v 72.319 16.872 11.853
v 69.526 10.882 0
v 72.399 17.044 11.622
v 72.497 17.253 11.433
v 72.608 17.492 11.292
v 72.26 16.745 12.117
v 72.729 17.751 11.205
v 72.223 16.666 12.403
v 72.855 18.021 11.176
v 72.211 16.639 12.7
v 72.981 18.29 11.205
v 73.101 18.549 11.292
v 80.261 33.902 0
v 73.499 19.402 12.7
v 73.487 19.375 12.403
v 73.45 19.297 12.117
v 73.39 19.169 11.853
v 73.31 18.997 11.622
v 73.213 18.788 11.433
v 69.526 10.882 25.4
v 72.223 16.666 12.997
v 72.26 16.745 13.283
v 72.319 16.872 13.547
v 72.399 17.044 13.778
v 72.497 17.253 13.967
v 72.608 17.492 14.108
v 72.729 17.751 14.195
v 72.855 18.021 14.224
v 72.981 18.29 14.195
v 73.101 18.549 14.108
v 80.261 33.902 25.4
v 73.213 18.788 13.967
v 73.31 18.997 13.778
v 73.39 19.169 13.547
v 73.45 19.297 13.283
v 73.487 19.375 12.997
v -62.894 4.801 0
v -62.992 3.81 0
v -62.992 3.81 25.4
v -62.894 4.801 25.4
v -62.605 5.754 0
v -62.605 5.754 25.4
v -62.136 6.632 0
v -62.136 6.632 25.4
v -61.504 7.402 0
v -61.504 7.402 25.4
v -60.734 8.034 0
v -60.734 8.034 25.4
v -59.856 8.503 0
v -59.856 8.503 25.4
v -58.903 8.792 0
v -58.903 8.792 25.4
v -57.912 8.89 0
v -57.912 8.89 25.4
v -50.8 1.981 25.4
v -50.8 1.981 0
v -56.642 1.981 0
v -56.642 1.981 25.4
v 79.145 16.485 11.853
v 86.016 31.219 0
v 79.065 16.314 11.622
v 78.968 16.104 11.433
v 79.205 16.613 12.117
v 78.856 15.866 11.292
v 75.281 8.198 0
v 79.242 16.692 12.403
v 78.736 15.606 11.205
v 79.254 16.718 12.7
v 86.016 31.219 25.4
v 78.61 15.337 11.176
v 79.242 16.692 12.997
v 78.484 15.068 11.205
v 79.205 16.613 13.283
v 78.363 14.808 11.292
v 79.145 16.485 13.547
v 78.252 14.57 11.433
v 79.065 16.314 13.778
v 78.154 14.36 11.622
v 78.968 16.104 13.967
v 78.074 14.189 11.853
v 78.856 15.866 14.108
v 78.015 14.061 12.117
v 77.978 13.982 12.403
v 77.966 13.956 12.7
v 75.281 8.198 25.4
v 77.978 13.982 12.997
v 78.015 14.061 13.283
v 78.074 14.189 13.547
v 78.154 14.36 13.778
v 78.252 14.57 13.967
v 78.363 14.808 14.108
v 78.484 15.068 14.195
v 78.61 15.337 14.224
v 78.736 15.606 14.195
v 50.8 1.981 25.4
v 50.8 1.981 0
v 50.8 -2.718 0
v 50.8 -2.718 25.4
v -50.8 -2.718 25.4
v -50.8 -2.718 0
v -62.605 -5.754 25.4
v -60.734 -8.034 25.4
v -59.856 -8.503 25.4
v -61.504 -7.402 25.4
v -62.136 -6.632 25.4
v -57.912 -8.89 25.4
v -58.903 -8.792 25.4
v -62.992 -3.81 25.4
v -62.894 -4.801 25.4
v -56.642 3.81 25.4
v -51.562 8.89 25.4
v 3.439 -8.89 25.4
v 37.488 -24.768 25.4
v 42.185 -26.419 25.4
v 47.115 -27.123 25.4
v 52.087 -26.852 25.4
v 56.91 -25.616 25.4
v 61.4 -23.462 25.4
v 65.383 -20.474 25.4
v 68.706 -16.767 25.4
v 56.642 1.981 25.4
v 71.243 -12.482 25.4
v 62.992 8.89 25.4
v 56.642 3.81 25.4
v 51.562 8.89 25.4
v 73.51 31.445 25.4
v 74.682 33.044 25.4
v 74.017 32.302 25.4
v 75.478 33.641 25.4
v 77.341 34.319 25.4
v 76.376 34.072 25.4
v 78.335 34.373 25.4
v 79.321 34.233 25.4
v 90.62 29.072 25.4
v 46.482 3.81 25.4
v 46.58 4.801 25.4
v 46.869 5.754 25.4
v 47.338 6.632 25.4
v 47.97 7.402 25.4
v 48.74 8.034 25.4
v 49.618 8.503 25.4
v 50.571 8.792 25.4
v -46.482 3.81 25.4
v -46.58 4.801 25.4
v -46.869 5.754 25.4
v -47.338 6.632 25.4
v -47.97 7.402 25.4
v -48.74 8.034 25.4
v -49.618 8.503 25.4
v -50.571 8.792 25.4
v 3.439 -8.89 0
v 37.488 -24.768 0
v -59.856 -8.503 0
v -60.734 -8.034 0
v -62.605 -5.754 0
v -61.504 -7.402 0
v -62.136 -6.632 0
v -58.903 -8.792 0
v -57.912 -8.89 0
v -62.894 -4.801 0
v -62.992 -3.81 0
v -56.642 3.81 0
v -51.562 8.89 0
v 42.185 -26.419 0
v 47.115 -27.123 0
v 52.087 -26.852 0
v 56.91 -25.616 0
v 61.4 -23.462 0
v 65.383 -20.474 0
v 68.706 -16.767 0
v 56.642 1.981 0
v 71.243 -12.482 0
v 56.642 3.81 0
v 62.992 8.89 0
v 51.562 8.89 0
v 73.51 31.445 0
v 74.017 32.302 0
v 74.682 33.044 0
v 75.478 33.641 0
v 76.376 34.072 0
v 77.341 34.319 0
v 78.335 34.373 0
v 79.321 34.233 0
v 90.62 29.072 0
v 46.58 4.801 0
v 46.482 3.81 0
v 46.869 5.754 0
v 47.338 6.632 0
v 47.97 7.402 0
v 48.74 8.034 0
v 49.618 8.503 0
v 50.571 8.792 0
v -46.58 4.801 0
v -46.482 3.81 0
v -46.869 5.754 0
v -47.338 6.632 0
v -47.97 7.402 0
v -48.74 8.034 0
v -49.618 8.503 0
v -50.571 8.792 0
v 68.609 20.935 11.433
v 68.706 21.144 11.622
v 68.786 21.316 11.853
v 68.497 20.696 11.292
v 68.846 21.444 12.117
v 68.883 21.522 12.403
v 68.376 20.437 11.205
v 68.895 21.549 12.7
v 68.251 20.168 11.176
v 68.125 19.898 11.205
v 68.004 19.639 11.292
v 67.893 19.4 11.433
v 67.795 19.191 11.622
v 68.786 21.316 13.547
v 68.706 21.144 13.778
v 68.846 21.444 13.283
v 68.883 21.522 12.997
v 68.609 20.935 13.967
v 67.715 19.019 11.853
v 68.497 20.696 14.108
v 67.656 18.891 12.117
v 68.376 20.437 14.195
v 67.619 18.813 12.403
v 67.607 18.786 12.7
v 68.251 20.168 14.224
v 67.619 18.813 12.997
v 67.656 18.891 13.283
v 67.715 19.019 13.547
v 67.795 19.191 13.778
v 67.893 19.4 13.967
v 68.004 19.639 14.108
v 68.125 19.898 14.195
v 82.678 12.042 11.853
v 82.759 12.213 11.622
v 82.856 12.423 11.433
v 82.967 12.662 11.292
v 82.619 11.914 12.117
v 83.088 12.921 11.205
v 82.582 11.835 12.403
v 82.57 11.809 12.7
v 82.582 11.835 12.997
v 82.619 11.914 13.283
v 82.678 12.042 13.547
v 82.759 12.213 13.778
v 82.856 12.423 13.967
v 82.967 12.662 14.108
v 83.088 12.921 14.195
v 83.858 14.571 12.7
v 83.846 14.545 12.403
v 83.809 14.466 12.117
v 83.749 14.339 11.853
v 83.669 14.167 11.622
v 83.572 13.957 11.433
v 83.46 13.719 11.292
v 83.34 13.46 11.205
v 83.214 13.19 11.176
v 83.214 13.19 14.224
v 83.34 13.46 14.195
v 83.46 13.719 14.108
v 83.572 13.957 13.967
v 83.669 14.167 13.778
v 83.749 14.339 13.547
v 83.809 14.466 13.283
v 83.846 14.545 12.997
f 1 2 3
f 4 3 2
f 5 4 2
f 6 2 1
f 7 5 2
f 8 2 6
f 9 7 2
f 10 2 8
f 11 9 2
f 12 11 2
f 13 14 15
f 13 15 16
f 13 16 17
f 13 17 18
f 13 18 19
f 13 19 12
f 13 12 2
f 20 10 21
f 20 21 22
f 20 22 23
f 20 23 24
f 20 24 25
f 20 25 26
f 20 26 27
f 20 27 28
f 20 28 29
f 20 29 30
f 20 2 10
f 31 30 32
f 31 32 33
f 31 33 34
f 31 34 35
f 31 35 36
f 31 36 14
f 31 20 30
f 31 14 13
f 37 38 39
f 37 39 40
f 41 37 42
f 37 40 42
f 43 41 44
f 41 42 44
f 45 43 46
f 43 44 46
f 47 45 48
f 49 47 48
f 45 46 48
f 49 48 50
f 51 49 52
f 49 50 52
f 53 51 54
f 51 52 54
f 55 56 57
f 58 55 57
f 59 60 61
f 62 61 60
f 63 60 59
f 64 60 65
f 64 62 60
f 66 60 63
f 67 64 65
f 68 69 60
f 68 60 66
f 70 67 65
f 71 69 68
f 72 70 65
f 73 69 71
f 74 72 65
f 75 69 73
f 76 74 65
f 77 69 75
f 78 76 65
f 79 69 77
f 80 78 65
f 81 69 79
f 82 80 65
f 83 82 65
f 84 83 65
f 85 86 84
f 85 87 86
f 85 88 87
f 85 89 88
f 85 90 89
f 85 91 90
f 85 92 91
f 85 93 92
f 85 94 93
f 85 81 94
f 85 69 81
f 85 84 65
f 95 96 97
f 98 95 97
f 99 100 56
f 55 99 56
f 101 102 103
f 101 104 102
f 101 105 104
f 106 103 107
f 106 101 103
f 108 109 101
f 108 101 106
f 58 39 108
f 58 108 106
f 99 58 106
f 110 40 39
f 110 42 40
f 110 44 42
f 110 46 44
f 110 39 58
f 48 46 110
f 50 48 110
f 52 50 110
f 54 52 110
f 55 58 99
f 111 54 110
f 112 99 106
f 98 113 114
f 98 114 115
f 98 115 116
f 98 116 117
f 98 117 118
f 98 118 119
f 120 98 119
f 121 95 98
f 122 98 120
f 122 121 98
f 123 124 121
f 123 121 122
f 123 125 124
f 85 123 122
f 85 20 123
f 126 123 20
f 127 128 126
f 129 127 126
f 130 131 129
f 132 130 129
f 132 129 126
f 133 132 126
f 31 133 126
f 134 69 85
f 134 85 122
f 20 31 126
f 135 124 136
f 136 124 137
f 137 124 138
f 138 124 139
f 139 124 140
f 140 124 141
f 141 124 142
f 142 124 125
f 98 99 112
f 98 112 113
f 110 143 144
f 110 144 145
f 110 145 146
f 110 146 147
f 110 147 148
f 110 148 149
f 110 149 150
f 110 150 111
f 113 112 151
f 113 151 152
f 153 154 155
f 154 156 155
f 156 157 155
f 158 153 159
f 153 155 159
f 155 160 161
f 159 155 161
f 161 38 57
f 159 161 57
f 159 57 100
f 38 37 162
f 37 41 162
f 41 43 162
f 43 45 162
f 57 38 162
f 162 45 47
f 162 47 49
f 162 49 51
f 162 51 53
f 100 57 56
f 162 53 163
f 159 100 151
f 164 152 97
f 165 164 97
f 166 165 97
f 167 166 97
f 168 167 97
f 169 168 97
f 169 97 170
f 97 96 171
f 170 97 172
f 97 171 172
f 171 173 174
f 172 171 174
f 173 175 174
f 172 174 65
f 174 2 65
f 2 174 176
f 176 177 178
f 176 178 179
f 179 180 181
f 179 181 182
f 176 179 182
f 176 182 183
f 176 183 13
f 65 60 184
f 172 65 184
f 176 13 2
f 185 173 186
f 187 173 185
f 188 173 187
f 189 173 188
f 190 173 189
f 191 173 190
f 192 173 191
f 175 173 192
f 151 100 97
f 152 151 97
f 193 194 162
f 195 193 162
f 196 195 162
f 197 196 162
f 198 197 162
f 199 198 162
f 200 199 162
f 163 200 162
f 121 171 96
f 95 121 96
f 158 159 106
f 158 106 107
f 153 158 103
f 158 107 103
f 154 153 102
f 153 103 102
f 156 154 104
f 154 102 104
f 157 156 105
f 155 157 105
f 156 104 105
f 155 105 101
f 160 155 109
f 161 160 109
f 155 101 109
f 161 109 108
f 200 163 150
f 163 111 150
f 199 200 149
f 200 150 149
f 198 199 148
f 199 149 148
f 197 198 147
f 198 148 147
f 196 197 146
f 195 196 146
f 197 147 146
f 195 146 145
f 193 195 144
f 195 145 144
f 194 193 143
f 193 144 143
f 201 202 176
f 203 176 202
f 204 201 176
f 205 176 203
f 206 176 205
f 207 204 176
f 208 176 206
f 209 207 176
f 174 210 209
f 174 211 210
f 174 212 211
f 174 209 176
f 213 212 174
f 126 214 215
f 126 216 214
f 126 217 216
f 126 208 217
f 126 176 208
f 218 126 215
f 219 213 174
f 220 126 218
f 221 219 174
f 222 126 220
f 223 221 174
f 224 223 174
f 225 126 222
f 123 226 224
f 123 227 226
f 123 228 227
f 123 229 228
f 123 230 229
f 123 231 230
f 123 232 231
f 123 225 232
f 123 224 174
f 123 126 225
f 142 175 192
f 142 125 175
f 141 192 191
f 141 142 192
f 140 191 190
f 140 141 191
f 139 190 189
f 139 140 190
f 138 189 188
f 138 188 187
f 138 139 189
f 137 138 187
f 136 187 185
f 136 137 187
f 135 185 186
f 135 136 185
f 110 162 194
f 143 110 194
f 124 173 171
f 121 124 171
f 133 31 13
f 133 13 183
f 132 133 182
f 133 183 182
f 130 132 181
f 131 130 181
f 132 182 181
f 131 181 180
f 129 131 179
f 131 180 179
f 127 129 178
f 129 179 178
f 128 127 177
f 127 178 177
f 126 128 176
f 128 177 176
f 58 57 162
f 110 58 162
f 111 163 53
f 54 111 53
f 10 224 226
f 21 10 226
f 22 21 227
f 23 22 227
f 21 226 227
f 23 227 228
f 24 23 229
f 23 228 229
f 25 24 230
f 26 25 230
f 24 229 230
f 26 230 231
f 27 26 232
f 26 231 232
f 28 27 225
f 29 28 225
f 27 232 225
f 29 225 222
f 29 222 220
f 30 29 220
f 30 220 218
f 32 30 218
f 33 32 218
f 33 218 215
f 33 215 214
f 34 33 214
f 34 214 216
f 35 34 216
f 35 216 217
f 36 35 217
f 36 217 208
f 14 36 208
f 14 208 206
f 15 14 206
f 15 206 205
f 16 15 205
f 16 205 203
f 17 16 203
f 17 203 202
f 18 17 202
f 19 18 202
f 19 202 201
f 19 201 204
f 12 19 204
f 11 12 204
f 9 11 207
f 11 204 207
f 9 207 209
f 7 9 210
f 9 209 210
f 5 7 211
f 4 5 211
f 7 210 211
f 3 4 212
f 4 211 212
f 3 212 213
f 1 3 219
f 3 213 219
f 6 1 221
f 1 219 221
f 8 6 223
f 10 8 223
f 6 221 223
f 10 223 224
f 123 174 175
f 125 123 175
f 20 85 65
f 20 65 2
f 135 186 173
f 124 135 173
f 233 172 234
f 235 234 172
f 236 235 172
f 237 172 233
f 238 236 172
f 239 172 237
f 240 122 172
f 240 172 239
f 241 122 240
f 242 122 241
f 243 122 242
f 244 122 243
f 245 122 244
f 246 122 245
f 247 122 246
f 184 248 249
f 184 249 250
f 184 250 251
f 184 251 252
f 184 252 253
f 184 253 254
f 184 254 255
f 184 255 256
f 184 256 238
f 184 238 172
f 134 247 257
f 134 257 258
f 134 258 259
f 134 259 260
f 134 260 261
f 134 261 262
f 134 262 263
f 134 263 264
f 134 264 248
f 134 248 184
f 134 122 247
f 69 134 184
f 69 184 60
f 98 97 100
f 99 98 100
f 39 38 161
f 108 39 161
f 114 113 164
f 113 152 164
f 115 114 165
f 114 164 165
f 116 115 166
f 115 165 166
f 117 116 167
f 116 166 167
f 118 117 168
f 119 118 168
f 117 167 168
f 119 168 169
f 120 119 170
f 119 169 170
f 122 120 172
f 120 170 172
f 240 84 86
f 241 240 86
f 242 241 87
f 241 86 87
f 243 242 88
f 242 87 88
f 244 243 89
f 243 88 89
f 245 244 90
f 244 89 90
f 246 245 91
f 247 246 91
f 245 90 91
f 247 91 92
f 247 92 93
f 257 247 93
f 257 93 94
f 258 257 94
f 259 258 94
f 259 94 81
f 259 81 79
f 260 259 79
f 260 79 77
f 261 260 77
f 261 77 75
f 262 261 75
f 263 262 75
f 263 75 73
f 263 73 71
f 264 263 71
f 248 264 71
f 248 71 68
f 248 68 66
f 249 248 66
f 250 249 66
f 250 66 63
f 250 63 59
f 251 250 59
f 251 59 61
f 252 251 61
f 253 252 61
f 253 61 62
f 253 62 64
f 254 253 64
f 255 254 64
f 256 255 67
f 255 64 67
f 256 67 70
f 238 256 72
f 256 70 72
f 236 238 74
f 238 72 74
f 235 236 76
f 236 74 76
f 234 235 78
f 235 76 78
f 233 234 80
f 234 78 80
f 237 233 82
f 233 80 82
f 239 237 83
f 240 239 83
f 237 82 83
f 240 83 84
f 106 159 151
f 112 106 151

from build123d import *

# Parameters (mm, degrees)
F1_DEPTH = 25.4
F3_DEPTH = 25.4
F4_R     = 25.4
F5_R     = 5.07999
F6_R     = 1.524
F7_DEPTH = 25.4


# Not quite as in the source:
# - a fillet or chamfer is up to 0.001 mm smaller than in the source, because OpenCascade refuses the exact size


with BuildPart() as f1:
    # F0 (on Top) → F1 (new body)
    with BuildSketch(Plane.XY):
        Polygon((-46.482, 8.89), (-62.992, 8.89), (-62.992, -8.89), (62.992, -8.89), (62.992, 8.89), (46.482, 8.89), (46.482, 3.81), (56.642, 3.81), (56.642, 1.9812), (50.8, 1.9812), (50.8, -2.7178), (-50.8, -2.7178), (-50.8, 1.9812), (-56.642, 1.9812), (-56.642, 3.81), (-46.482, 3.81), align=None)
    extrude(amount=F1_DEPTH)

    # F2 (on face) → F3 (join)
    with BuildSketch(Plane.XY.offset(25.4)):
        Polygon((75.6565171085, 36.049144584), (62.992, 8.89), (62.992, -8.89), (3.4387046284, -8.89), (60.5084189693, -35.5020448459), (90.6196586724, 29.0717170827), (86.0156151143, 31.2186178523), (75.2811112661, 8.1984000616), (69.5260568184, 10.8820260237), (80.2605606666, 33.9022438144), align=None)
    extrude(amount=-F3_DEPTH)

    # F4
    f4_edges = [f1.edges().sort_by_distance(p)[0] for p in [
        (60.508419, -35.502045, 12.7),
    ]]
    fillet(f4_edges, radius=F4_R)

    # F5 (radius 5.08 in the source; OpenCascade refuses exactly that, so slightly less here)
    f5_edges = [f1.edges().sort_by_distance(p)[0] for p in [
        (-62.992, -8.89, 12.7),
        (-62.992, 8.89, 12.7),
        (75.656517, 36.049145, 12.7),
        (46.482, 8.89, 12.7),
        (-46.482, 8.89, 12.7),
    ]]
    fillet(f5_edges, radius=F5_R)

    # F6 (on face) → F7 (cut)
    with BuildSketch(Plane(origin=(48.336171005, -22.5395267055, 0), x_dir=(-0.4226182617, -0.906307787, 0), z_dir=(-0.906307787, 0.4226182617, 0))):
        with Locations((-47.1220459863, 12.7)):
            Circle(F6_R)
    extrude(amount=-F7_DEPTH, mode=Mode.SUBTRACT)


solid = f1.part
